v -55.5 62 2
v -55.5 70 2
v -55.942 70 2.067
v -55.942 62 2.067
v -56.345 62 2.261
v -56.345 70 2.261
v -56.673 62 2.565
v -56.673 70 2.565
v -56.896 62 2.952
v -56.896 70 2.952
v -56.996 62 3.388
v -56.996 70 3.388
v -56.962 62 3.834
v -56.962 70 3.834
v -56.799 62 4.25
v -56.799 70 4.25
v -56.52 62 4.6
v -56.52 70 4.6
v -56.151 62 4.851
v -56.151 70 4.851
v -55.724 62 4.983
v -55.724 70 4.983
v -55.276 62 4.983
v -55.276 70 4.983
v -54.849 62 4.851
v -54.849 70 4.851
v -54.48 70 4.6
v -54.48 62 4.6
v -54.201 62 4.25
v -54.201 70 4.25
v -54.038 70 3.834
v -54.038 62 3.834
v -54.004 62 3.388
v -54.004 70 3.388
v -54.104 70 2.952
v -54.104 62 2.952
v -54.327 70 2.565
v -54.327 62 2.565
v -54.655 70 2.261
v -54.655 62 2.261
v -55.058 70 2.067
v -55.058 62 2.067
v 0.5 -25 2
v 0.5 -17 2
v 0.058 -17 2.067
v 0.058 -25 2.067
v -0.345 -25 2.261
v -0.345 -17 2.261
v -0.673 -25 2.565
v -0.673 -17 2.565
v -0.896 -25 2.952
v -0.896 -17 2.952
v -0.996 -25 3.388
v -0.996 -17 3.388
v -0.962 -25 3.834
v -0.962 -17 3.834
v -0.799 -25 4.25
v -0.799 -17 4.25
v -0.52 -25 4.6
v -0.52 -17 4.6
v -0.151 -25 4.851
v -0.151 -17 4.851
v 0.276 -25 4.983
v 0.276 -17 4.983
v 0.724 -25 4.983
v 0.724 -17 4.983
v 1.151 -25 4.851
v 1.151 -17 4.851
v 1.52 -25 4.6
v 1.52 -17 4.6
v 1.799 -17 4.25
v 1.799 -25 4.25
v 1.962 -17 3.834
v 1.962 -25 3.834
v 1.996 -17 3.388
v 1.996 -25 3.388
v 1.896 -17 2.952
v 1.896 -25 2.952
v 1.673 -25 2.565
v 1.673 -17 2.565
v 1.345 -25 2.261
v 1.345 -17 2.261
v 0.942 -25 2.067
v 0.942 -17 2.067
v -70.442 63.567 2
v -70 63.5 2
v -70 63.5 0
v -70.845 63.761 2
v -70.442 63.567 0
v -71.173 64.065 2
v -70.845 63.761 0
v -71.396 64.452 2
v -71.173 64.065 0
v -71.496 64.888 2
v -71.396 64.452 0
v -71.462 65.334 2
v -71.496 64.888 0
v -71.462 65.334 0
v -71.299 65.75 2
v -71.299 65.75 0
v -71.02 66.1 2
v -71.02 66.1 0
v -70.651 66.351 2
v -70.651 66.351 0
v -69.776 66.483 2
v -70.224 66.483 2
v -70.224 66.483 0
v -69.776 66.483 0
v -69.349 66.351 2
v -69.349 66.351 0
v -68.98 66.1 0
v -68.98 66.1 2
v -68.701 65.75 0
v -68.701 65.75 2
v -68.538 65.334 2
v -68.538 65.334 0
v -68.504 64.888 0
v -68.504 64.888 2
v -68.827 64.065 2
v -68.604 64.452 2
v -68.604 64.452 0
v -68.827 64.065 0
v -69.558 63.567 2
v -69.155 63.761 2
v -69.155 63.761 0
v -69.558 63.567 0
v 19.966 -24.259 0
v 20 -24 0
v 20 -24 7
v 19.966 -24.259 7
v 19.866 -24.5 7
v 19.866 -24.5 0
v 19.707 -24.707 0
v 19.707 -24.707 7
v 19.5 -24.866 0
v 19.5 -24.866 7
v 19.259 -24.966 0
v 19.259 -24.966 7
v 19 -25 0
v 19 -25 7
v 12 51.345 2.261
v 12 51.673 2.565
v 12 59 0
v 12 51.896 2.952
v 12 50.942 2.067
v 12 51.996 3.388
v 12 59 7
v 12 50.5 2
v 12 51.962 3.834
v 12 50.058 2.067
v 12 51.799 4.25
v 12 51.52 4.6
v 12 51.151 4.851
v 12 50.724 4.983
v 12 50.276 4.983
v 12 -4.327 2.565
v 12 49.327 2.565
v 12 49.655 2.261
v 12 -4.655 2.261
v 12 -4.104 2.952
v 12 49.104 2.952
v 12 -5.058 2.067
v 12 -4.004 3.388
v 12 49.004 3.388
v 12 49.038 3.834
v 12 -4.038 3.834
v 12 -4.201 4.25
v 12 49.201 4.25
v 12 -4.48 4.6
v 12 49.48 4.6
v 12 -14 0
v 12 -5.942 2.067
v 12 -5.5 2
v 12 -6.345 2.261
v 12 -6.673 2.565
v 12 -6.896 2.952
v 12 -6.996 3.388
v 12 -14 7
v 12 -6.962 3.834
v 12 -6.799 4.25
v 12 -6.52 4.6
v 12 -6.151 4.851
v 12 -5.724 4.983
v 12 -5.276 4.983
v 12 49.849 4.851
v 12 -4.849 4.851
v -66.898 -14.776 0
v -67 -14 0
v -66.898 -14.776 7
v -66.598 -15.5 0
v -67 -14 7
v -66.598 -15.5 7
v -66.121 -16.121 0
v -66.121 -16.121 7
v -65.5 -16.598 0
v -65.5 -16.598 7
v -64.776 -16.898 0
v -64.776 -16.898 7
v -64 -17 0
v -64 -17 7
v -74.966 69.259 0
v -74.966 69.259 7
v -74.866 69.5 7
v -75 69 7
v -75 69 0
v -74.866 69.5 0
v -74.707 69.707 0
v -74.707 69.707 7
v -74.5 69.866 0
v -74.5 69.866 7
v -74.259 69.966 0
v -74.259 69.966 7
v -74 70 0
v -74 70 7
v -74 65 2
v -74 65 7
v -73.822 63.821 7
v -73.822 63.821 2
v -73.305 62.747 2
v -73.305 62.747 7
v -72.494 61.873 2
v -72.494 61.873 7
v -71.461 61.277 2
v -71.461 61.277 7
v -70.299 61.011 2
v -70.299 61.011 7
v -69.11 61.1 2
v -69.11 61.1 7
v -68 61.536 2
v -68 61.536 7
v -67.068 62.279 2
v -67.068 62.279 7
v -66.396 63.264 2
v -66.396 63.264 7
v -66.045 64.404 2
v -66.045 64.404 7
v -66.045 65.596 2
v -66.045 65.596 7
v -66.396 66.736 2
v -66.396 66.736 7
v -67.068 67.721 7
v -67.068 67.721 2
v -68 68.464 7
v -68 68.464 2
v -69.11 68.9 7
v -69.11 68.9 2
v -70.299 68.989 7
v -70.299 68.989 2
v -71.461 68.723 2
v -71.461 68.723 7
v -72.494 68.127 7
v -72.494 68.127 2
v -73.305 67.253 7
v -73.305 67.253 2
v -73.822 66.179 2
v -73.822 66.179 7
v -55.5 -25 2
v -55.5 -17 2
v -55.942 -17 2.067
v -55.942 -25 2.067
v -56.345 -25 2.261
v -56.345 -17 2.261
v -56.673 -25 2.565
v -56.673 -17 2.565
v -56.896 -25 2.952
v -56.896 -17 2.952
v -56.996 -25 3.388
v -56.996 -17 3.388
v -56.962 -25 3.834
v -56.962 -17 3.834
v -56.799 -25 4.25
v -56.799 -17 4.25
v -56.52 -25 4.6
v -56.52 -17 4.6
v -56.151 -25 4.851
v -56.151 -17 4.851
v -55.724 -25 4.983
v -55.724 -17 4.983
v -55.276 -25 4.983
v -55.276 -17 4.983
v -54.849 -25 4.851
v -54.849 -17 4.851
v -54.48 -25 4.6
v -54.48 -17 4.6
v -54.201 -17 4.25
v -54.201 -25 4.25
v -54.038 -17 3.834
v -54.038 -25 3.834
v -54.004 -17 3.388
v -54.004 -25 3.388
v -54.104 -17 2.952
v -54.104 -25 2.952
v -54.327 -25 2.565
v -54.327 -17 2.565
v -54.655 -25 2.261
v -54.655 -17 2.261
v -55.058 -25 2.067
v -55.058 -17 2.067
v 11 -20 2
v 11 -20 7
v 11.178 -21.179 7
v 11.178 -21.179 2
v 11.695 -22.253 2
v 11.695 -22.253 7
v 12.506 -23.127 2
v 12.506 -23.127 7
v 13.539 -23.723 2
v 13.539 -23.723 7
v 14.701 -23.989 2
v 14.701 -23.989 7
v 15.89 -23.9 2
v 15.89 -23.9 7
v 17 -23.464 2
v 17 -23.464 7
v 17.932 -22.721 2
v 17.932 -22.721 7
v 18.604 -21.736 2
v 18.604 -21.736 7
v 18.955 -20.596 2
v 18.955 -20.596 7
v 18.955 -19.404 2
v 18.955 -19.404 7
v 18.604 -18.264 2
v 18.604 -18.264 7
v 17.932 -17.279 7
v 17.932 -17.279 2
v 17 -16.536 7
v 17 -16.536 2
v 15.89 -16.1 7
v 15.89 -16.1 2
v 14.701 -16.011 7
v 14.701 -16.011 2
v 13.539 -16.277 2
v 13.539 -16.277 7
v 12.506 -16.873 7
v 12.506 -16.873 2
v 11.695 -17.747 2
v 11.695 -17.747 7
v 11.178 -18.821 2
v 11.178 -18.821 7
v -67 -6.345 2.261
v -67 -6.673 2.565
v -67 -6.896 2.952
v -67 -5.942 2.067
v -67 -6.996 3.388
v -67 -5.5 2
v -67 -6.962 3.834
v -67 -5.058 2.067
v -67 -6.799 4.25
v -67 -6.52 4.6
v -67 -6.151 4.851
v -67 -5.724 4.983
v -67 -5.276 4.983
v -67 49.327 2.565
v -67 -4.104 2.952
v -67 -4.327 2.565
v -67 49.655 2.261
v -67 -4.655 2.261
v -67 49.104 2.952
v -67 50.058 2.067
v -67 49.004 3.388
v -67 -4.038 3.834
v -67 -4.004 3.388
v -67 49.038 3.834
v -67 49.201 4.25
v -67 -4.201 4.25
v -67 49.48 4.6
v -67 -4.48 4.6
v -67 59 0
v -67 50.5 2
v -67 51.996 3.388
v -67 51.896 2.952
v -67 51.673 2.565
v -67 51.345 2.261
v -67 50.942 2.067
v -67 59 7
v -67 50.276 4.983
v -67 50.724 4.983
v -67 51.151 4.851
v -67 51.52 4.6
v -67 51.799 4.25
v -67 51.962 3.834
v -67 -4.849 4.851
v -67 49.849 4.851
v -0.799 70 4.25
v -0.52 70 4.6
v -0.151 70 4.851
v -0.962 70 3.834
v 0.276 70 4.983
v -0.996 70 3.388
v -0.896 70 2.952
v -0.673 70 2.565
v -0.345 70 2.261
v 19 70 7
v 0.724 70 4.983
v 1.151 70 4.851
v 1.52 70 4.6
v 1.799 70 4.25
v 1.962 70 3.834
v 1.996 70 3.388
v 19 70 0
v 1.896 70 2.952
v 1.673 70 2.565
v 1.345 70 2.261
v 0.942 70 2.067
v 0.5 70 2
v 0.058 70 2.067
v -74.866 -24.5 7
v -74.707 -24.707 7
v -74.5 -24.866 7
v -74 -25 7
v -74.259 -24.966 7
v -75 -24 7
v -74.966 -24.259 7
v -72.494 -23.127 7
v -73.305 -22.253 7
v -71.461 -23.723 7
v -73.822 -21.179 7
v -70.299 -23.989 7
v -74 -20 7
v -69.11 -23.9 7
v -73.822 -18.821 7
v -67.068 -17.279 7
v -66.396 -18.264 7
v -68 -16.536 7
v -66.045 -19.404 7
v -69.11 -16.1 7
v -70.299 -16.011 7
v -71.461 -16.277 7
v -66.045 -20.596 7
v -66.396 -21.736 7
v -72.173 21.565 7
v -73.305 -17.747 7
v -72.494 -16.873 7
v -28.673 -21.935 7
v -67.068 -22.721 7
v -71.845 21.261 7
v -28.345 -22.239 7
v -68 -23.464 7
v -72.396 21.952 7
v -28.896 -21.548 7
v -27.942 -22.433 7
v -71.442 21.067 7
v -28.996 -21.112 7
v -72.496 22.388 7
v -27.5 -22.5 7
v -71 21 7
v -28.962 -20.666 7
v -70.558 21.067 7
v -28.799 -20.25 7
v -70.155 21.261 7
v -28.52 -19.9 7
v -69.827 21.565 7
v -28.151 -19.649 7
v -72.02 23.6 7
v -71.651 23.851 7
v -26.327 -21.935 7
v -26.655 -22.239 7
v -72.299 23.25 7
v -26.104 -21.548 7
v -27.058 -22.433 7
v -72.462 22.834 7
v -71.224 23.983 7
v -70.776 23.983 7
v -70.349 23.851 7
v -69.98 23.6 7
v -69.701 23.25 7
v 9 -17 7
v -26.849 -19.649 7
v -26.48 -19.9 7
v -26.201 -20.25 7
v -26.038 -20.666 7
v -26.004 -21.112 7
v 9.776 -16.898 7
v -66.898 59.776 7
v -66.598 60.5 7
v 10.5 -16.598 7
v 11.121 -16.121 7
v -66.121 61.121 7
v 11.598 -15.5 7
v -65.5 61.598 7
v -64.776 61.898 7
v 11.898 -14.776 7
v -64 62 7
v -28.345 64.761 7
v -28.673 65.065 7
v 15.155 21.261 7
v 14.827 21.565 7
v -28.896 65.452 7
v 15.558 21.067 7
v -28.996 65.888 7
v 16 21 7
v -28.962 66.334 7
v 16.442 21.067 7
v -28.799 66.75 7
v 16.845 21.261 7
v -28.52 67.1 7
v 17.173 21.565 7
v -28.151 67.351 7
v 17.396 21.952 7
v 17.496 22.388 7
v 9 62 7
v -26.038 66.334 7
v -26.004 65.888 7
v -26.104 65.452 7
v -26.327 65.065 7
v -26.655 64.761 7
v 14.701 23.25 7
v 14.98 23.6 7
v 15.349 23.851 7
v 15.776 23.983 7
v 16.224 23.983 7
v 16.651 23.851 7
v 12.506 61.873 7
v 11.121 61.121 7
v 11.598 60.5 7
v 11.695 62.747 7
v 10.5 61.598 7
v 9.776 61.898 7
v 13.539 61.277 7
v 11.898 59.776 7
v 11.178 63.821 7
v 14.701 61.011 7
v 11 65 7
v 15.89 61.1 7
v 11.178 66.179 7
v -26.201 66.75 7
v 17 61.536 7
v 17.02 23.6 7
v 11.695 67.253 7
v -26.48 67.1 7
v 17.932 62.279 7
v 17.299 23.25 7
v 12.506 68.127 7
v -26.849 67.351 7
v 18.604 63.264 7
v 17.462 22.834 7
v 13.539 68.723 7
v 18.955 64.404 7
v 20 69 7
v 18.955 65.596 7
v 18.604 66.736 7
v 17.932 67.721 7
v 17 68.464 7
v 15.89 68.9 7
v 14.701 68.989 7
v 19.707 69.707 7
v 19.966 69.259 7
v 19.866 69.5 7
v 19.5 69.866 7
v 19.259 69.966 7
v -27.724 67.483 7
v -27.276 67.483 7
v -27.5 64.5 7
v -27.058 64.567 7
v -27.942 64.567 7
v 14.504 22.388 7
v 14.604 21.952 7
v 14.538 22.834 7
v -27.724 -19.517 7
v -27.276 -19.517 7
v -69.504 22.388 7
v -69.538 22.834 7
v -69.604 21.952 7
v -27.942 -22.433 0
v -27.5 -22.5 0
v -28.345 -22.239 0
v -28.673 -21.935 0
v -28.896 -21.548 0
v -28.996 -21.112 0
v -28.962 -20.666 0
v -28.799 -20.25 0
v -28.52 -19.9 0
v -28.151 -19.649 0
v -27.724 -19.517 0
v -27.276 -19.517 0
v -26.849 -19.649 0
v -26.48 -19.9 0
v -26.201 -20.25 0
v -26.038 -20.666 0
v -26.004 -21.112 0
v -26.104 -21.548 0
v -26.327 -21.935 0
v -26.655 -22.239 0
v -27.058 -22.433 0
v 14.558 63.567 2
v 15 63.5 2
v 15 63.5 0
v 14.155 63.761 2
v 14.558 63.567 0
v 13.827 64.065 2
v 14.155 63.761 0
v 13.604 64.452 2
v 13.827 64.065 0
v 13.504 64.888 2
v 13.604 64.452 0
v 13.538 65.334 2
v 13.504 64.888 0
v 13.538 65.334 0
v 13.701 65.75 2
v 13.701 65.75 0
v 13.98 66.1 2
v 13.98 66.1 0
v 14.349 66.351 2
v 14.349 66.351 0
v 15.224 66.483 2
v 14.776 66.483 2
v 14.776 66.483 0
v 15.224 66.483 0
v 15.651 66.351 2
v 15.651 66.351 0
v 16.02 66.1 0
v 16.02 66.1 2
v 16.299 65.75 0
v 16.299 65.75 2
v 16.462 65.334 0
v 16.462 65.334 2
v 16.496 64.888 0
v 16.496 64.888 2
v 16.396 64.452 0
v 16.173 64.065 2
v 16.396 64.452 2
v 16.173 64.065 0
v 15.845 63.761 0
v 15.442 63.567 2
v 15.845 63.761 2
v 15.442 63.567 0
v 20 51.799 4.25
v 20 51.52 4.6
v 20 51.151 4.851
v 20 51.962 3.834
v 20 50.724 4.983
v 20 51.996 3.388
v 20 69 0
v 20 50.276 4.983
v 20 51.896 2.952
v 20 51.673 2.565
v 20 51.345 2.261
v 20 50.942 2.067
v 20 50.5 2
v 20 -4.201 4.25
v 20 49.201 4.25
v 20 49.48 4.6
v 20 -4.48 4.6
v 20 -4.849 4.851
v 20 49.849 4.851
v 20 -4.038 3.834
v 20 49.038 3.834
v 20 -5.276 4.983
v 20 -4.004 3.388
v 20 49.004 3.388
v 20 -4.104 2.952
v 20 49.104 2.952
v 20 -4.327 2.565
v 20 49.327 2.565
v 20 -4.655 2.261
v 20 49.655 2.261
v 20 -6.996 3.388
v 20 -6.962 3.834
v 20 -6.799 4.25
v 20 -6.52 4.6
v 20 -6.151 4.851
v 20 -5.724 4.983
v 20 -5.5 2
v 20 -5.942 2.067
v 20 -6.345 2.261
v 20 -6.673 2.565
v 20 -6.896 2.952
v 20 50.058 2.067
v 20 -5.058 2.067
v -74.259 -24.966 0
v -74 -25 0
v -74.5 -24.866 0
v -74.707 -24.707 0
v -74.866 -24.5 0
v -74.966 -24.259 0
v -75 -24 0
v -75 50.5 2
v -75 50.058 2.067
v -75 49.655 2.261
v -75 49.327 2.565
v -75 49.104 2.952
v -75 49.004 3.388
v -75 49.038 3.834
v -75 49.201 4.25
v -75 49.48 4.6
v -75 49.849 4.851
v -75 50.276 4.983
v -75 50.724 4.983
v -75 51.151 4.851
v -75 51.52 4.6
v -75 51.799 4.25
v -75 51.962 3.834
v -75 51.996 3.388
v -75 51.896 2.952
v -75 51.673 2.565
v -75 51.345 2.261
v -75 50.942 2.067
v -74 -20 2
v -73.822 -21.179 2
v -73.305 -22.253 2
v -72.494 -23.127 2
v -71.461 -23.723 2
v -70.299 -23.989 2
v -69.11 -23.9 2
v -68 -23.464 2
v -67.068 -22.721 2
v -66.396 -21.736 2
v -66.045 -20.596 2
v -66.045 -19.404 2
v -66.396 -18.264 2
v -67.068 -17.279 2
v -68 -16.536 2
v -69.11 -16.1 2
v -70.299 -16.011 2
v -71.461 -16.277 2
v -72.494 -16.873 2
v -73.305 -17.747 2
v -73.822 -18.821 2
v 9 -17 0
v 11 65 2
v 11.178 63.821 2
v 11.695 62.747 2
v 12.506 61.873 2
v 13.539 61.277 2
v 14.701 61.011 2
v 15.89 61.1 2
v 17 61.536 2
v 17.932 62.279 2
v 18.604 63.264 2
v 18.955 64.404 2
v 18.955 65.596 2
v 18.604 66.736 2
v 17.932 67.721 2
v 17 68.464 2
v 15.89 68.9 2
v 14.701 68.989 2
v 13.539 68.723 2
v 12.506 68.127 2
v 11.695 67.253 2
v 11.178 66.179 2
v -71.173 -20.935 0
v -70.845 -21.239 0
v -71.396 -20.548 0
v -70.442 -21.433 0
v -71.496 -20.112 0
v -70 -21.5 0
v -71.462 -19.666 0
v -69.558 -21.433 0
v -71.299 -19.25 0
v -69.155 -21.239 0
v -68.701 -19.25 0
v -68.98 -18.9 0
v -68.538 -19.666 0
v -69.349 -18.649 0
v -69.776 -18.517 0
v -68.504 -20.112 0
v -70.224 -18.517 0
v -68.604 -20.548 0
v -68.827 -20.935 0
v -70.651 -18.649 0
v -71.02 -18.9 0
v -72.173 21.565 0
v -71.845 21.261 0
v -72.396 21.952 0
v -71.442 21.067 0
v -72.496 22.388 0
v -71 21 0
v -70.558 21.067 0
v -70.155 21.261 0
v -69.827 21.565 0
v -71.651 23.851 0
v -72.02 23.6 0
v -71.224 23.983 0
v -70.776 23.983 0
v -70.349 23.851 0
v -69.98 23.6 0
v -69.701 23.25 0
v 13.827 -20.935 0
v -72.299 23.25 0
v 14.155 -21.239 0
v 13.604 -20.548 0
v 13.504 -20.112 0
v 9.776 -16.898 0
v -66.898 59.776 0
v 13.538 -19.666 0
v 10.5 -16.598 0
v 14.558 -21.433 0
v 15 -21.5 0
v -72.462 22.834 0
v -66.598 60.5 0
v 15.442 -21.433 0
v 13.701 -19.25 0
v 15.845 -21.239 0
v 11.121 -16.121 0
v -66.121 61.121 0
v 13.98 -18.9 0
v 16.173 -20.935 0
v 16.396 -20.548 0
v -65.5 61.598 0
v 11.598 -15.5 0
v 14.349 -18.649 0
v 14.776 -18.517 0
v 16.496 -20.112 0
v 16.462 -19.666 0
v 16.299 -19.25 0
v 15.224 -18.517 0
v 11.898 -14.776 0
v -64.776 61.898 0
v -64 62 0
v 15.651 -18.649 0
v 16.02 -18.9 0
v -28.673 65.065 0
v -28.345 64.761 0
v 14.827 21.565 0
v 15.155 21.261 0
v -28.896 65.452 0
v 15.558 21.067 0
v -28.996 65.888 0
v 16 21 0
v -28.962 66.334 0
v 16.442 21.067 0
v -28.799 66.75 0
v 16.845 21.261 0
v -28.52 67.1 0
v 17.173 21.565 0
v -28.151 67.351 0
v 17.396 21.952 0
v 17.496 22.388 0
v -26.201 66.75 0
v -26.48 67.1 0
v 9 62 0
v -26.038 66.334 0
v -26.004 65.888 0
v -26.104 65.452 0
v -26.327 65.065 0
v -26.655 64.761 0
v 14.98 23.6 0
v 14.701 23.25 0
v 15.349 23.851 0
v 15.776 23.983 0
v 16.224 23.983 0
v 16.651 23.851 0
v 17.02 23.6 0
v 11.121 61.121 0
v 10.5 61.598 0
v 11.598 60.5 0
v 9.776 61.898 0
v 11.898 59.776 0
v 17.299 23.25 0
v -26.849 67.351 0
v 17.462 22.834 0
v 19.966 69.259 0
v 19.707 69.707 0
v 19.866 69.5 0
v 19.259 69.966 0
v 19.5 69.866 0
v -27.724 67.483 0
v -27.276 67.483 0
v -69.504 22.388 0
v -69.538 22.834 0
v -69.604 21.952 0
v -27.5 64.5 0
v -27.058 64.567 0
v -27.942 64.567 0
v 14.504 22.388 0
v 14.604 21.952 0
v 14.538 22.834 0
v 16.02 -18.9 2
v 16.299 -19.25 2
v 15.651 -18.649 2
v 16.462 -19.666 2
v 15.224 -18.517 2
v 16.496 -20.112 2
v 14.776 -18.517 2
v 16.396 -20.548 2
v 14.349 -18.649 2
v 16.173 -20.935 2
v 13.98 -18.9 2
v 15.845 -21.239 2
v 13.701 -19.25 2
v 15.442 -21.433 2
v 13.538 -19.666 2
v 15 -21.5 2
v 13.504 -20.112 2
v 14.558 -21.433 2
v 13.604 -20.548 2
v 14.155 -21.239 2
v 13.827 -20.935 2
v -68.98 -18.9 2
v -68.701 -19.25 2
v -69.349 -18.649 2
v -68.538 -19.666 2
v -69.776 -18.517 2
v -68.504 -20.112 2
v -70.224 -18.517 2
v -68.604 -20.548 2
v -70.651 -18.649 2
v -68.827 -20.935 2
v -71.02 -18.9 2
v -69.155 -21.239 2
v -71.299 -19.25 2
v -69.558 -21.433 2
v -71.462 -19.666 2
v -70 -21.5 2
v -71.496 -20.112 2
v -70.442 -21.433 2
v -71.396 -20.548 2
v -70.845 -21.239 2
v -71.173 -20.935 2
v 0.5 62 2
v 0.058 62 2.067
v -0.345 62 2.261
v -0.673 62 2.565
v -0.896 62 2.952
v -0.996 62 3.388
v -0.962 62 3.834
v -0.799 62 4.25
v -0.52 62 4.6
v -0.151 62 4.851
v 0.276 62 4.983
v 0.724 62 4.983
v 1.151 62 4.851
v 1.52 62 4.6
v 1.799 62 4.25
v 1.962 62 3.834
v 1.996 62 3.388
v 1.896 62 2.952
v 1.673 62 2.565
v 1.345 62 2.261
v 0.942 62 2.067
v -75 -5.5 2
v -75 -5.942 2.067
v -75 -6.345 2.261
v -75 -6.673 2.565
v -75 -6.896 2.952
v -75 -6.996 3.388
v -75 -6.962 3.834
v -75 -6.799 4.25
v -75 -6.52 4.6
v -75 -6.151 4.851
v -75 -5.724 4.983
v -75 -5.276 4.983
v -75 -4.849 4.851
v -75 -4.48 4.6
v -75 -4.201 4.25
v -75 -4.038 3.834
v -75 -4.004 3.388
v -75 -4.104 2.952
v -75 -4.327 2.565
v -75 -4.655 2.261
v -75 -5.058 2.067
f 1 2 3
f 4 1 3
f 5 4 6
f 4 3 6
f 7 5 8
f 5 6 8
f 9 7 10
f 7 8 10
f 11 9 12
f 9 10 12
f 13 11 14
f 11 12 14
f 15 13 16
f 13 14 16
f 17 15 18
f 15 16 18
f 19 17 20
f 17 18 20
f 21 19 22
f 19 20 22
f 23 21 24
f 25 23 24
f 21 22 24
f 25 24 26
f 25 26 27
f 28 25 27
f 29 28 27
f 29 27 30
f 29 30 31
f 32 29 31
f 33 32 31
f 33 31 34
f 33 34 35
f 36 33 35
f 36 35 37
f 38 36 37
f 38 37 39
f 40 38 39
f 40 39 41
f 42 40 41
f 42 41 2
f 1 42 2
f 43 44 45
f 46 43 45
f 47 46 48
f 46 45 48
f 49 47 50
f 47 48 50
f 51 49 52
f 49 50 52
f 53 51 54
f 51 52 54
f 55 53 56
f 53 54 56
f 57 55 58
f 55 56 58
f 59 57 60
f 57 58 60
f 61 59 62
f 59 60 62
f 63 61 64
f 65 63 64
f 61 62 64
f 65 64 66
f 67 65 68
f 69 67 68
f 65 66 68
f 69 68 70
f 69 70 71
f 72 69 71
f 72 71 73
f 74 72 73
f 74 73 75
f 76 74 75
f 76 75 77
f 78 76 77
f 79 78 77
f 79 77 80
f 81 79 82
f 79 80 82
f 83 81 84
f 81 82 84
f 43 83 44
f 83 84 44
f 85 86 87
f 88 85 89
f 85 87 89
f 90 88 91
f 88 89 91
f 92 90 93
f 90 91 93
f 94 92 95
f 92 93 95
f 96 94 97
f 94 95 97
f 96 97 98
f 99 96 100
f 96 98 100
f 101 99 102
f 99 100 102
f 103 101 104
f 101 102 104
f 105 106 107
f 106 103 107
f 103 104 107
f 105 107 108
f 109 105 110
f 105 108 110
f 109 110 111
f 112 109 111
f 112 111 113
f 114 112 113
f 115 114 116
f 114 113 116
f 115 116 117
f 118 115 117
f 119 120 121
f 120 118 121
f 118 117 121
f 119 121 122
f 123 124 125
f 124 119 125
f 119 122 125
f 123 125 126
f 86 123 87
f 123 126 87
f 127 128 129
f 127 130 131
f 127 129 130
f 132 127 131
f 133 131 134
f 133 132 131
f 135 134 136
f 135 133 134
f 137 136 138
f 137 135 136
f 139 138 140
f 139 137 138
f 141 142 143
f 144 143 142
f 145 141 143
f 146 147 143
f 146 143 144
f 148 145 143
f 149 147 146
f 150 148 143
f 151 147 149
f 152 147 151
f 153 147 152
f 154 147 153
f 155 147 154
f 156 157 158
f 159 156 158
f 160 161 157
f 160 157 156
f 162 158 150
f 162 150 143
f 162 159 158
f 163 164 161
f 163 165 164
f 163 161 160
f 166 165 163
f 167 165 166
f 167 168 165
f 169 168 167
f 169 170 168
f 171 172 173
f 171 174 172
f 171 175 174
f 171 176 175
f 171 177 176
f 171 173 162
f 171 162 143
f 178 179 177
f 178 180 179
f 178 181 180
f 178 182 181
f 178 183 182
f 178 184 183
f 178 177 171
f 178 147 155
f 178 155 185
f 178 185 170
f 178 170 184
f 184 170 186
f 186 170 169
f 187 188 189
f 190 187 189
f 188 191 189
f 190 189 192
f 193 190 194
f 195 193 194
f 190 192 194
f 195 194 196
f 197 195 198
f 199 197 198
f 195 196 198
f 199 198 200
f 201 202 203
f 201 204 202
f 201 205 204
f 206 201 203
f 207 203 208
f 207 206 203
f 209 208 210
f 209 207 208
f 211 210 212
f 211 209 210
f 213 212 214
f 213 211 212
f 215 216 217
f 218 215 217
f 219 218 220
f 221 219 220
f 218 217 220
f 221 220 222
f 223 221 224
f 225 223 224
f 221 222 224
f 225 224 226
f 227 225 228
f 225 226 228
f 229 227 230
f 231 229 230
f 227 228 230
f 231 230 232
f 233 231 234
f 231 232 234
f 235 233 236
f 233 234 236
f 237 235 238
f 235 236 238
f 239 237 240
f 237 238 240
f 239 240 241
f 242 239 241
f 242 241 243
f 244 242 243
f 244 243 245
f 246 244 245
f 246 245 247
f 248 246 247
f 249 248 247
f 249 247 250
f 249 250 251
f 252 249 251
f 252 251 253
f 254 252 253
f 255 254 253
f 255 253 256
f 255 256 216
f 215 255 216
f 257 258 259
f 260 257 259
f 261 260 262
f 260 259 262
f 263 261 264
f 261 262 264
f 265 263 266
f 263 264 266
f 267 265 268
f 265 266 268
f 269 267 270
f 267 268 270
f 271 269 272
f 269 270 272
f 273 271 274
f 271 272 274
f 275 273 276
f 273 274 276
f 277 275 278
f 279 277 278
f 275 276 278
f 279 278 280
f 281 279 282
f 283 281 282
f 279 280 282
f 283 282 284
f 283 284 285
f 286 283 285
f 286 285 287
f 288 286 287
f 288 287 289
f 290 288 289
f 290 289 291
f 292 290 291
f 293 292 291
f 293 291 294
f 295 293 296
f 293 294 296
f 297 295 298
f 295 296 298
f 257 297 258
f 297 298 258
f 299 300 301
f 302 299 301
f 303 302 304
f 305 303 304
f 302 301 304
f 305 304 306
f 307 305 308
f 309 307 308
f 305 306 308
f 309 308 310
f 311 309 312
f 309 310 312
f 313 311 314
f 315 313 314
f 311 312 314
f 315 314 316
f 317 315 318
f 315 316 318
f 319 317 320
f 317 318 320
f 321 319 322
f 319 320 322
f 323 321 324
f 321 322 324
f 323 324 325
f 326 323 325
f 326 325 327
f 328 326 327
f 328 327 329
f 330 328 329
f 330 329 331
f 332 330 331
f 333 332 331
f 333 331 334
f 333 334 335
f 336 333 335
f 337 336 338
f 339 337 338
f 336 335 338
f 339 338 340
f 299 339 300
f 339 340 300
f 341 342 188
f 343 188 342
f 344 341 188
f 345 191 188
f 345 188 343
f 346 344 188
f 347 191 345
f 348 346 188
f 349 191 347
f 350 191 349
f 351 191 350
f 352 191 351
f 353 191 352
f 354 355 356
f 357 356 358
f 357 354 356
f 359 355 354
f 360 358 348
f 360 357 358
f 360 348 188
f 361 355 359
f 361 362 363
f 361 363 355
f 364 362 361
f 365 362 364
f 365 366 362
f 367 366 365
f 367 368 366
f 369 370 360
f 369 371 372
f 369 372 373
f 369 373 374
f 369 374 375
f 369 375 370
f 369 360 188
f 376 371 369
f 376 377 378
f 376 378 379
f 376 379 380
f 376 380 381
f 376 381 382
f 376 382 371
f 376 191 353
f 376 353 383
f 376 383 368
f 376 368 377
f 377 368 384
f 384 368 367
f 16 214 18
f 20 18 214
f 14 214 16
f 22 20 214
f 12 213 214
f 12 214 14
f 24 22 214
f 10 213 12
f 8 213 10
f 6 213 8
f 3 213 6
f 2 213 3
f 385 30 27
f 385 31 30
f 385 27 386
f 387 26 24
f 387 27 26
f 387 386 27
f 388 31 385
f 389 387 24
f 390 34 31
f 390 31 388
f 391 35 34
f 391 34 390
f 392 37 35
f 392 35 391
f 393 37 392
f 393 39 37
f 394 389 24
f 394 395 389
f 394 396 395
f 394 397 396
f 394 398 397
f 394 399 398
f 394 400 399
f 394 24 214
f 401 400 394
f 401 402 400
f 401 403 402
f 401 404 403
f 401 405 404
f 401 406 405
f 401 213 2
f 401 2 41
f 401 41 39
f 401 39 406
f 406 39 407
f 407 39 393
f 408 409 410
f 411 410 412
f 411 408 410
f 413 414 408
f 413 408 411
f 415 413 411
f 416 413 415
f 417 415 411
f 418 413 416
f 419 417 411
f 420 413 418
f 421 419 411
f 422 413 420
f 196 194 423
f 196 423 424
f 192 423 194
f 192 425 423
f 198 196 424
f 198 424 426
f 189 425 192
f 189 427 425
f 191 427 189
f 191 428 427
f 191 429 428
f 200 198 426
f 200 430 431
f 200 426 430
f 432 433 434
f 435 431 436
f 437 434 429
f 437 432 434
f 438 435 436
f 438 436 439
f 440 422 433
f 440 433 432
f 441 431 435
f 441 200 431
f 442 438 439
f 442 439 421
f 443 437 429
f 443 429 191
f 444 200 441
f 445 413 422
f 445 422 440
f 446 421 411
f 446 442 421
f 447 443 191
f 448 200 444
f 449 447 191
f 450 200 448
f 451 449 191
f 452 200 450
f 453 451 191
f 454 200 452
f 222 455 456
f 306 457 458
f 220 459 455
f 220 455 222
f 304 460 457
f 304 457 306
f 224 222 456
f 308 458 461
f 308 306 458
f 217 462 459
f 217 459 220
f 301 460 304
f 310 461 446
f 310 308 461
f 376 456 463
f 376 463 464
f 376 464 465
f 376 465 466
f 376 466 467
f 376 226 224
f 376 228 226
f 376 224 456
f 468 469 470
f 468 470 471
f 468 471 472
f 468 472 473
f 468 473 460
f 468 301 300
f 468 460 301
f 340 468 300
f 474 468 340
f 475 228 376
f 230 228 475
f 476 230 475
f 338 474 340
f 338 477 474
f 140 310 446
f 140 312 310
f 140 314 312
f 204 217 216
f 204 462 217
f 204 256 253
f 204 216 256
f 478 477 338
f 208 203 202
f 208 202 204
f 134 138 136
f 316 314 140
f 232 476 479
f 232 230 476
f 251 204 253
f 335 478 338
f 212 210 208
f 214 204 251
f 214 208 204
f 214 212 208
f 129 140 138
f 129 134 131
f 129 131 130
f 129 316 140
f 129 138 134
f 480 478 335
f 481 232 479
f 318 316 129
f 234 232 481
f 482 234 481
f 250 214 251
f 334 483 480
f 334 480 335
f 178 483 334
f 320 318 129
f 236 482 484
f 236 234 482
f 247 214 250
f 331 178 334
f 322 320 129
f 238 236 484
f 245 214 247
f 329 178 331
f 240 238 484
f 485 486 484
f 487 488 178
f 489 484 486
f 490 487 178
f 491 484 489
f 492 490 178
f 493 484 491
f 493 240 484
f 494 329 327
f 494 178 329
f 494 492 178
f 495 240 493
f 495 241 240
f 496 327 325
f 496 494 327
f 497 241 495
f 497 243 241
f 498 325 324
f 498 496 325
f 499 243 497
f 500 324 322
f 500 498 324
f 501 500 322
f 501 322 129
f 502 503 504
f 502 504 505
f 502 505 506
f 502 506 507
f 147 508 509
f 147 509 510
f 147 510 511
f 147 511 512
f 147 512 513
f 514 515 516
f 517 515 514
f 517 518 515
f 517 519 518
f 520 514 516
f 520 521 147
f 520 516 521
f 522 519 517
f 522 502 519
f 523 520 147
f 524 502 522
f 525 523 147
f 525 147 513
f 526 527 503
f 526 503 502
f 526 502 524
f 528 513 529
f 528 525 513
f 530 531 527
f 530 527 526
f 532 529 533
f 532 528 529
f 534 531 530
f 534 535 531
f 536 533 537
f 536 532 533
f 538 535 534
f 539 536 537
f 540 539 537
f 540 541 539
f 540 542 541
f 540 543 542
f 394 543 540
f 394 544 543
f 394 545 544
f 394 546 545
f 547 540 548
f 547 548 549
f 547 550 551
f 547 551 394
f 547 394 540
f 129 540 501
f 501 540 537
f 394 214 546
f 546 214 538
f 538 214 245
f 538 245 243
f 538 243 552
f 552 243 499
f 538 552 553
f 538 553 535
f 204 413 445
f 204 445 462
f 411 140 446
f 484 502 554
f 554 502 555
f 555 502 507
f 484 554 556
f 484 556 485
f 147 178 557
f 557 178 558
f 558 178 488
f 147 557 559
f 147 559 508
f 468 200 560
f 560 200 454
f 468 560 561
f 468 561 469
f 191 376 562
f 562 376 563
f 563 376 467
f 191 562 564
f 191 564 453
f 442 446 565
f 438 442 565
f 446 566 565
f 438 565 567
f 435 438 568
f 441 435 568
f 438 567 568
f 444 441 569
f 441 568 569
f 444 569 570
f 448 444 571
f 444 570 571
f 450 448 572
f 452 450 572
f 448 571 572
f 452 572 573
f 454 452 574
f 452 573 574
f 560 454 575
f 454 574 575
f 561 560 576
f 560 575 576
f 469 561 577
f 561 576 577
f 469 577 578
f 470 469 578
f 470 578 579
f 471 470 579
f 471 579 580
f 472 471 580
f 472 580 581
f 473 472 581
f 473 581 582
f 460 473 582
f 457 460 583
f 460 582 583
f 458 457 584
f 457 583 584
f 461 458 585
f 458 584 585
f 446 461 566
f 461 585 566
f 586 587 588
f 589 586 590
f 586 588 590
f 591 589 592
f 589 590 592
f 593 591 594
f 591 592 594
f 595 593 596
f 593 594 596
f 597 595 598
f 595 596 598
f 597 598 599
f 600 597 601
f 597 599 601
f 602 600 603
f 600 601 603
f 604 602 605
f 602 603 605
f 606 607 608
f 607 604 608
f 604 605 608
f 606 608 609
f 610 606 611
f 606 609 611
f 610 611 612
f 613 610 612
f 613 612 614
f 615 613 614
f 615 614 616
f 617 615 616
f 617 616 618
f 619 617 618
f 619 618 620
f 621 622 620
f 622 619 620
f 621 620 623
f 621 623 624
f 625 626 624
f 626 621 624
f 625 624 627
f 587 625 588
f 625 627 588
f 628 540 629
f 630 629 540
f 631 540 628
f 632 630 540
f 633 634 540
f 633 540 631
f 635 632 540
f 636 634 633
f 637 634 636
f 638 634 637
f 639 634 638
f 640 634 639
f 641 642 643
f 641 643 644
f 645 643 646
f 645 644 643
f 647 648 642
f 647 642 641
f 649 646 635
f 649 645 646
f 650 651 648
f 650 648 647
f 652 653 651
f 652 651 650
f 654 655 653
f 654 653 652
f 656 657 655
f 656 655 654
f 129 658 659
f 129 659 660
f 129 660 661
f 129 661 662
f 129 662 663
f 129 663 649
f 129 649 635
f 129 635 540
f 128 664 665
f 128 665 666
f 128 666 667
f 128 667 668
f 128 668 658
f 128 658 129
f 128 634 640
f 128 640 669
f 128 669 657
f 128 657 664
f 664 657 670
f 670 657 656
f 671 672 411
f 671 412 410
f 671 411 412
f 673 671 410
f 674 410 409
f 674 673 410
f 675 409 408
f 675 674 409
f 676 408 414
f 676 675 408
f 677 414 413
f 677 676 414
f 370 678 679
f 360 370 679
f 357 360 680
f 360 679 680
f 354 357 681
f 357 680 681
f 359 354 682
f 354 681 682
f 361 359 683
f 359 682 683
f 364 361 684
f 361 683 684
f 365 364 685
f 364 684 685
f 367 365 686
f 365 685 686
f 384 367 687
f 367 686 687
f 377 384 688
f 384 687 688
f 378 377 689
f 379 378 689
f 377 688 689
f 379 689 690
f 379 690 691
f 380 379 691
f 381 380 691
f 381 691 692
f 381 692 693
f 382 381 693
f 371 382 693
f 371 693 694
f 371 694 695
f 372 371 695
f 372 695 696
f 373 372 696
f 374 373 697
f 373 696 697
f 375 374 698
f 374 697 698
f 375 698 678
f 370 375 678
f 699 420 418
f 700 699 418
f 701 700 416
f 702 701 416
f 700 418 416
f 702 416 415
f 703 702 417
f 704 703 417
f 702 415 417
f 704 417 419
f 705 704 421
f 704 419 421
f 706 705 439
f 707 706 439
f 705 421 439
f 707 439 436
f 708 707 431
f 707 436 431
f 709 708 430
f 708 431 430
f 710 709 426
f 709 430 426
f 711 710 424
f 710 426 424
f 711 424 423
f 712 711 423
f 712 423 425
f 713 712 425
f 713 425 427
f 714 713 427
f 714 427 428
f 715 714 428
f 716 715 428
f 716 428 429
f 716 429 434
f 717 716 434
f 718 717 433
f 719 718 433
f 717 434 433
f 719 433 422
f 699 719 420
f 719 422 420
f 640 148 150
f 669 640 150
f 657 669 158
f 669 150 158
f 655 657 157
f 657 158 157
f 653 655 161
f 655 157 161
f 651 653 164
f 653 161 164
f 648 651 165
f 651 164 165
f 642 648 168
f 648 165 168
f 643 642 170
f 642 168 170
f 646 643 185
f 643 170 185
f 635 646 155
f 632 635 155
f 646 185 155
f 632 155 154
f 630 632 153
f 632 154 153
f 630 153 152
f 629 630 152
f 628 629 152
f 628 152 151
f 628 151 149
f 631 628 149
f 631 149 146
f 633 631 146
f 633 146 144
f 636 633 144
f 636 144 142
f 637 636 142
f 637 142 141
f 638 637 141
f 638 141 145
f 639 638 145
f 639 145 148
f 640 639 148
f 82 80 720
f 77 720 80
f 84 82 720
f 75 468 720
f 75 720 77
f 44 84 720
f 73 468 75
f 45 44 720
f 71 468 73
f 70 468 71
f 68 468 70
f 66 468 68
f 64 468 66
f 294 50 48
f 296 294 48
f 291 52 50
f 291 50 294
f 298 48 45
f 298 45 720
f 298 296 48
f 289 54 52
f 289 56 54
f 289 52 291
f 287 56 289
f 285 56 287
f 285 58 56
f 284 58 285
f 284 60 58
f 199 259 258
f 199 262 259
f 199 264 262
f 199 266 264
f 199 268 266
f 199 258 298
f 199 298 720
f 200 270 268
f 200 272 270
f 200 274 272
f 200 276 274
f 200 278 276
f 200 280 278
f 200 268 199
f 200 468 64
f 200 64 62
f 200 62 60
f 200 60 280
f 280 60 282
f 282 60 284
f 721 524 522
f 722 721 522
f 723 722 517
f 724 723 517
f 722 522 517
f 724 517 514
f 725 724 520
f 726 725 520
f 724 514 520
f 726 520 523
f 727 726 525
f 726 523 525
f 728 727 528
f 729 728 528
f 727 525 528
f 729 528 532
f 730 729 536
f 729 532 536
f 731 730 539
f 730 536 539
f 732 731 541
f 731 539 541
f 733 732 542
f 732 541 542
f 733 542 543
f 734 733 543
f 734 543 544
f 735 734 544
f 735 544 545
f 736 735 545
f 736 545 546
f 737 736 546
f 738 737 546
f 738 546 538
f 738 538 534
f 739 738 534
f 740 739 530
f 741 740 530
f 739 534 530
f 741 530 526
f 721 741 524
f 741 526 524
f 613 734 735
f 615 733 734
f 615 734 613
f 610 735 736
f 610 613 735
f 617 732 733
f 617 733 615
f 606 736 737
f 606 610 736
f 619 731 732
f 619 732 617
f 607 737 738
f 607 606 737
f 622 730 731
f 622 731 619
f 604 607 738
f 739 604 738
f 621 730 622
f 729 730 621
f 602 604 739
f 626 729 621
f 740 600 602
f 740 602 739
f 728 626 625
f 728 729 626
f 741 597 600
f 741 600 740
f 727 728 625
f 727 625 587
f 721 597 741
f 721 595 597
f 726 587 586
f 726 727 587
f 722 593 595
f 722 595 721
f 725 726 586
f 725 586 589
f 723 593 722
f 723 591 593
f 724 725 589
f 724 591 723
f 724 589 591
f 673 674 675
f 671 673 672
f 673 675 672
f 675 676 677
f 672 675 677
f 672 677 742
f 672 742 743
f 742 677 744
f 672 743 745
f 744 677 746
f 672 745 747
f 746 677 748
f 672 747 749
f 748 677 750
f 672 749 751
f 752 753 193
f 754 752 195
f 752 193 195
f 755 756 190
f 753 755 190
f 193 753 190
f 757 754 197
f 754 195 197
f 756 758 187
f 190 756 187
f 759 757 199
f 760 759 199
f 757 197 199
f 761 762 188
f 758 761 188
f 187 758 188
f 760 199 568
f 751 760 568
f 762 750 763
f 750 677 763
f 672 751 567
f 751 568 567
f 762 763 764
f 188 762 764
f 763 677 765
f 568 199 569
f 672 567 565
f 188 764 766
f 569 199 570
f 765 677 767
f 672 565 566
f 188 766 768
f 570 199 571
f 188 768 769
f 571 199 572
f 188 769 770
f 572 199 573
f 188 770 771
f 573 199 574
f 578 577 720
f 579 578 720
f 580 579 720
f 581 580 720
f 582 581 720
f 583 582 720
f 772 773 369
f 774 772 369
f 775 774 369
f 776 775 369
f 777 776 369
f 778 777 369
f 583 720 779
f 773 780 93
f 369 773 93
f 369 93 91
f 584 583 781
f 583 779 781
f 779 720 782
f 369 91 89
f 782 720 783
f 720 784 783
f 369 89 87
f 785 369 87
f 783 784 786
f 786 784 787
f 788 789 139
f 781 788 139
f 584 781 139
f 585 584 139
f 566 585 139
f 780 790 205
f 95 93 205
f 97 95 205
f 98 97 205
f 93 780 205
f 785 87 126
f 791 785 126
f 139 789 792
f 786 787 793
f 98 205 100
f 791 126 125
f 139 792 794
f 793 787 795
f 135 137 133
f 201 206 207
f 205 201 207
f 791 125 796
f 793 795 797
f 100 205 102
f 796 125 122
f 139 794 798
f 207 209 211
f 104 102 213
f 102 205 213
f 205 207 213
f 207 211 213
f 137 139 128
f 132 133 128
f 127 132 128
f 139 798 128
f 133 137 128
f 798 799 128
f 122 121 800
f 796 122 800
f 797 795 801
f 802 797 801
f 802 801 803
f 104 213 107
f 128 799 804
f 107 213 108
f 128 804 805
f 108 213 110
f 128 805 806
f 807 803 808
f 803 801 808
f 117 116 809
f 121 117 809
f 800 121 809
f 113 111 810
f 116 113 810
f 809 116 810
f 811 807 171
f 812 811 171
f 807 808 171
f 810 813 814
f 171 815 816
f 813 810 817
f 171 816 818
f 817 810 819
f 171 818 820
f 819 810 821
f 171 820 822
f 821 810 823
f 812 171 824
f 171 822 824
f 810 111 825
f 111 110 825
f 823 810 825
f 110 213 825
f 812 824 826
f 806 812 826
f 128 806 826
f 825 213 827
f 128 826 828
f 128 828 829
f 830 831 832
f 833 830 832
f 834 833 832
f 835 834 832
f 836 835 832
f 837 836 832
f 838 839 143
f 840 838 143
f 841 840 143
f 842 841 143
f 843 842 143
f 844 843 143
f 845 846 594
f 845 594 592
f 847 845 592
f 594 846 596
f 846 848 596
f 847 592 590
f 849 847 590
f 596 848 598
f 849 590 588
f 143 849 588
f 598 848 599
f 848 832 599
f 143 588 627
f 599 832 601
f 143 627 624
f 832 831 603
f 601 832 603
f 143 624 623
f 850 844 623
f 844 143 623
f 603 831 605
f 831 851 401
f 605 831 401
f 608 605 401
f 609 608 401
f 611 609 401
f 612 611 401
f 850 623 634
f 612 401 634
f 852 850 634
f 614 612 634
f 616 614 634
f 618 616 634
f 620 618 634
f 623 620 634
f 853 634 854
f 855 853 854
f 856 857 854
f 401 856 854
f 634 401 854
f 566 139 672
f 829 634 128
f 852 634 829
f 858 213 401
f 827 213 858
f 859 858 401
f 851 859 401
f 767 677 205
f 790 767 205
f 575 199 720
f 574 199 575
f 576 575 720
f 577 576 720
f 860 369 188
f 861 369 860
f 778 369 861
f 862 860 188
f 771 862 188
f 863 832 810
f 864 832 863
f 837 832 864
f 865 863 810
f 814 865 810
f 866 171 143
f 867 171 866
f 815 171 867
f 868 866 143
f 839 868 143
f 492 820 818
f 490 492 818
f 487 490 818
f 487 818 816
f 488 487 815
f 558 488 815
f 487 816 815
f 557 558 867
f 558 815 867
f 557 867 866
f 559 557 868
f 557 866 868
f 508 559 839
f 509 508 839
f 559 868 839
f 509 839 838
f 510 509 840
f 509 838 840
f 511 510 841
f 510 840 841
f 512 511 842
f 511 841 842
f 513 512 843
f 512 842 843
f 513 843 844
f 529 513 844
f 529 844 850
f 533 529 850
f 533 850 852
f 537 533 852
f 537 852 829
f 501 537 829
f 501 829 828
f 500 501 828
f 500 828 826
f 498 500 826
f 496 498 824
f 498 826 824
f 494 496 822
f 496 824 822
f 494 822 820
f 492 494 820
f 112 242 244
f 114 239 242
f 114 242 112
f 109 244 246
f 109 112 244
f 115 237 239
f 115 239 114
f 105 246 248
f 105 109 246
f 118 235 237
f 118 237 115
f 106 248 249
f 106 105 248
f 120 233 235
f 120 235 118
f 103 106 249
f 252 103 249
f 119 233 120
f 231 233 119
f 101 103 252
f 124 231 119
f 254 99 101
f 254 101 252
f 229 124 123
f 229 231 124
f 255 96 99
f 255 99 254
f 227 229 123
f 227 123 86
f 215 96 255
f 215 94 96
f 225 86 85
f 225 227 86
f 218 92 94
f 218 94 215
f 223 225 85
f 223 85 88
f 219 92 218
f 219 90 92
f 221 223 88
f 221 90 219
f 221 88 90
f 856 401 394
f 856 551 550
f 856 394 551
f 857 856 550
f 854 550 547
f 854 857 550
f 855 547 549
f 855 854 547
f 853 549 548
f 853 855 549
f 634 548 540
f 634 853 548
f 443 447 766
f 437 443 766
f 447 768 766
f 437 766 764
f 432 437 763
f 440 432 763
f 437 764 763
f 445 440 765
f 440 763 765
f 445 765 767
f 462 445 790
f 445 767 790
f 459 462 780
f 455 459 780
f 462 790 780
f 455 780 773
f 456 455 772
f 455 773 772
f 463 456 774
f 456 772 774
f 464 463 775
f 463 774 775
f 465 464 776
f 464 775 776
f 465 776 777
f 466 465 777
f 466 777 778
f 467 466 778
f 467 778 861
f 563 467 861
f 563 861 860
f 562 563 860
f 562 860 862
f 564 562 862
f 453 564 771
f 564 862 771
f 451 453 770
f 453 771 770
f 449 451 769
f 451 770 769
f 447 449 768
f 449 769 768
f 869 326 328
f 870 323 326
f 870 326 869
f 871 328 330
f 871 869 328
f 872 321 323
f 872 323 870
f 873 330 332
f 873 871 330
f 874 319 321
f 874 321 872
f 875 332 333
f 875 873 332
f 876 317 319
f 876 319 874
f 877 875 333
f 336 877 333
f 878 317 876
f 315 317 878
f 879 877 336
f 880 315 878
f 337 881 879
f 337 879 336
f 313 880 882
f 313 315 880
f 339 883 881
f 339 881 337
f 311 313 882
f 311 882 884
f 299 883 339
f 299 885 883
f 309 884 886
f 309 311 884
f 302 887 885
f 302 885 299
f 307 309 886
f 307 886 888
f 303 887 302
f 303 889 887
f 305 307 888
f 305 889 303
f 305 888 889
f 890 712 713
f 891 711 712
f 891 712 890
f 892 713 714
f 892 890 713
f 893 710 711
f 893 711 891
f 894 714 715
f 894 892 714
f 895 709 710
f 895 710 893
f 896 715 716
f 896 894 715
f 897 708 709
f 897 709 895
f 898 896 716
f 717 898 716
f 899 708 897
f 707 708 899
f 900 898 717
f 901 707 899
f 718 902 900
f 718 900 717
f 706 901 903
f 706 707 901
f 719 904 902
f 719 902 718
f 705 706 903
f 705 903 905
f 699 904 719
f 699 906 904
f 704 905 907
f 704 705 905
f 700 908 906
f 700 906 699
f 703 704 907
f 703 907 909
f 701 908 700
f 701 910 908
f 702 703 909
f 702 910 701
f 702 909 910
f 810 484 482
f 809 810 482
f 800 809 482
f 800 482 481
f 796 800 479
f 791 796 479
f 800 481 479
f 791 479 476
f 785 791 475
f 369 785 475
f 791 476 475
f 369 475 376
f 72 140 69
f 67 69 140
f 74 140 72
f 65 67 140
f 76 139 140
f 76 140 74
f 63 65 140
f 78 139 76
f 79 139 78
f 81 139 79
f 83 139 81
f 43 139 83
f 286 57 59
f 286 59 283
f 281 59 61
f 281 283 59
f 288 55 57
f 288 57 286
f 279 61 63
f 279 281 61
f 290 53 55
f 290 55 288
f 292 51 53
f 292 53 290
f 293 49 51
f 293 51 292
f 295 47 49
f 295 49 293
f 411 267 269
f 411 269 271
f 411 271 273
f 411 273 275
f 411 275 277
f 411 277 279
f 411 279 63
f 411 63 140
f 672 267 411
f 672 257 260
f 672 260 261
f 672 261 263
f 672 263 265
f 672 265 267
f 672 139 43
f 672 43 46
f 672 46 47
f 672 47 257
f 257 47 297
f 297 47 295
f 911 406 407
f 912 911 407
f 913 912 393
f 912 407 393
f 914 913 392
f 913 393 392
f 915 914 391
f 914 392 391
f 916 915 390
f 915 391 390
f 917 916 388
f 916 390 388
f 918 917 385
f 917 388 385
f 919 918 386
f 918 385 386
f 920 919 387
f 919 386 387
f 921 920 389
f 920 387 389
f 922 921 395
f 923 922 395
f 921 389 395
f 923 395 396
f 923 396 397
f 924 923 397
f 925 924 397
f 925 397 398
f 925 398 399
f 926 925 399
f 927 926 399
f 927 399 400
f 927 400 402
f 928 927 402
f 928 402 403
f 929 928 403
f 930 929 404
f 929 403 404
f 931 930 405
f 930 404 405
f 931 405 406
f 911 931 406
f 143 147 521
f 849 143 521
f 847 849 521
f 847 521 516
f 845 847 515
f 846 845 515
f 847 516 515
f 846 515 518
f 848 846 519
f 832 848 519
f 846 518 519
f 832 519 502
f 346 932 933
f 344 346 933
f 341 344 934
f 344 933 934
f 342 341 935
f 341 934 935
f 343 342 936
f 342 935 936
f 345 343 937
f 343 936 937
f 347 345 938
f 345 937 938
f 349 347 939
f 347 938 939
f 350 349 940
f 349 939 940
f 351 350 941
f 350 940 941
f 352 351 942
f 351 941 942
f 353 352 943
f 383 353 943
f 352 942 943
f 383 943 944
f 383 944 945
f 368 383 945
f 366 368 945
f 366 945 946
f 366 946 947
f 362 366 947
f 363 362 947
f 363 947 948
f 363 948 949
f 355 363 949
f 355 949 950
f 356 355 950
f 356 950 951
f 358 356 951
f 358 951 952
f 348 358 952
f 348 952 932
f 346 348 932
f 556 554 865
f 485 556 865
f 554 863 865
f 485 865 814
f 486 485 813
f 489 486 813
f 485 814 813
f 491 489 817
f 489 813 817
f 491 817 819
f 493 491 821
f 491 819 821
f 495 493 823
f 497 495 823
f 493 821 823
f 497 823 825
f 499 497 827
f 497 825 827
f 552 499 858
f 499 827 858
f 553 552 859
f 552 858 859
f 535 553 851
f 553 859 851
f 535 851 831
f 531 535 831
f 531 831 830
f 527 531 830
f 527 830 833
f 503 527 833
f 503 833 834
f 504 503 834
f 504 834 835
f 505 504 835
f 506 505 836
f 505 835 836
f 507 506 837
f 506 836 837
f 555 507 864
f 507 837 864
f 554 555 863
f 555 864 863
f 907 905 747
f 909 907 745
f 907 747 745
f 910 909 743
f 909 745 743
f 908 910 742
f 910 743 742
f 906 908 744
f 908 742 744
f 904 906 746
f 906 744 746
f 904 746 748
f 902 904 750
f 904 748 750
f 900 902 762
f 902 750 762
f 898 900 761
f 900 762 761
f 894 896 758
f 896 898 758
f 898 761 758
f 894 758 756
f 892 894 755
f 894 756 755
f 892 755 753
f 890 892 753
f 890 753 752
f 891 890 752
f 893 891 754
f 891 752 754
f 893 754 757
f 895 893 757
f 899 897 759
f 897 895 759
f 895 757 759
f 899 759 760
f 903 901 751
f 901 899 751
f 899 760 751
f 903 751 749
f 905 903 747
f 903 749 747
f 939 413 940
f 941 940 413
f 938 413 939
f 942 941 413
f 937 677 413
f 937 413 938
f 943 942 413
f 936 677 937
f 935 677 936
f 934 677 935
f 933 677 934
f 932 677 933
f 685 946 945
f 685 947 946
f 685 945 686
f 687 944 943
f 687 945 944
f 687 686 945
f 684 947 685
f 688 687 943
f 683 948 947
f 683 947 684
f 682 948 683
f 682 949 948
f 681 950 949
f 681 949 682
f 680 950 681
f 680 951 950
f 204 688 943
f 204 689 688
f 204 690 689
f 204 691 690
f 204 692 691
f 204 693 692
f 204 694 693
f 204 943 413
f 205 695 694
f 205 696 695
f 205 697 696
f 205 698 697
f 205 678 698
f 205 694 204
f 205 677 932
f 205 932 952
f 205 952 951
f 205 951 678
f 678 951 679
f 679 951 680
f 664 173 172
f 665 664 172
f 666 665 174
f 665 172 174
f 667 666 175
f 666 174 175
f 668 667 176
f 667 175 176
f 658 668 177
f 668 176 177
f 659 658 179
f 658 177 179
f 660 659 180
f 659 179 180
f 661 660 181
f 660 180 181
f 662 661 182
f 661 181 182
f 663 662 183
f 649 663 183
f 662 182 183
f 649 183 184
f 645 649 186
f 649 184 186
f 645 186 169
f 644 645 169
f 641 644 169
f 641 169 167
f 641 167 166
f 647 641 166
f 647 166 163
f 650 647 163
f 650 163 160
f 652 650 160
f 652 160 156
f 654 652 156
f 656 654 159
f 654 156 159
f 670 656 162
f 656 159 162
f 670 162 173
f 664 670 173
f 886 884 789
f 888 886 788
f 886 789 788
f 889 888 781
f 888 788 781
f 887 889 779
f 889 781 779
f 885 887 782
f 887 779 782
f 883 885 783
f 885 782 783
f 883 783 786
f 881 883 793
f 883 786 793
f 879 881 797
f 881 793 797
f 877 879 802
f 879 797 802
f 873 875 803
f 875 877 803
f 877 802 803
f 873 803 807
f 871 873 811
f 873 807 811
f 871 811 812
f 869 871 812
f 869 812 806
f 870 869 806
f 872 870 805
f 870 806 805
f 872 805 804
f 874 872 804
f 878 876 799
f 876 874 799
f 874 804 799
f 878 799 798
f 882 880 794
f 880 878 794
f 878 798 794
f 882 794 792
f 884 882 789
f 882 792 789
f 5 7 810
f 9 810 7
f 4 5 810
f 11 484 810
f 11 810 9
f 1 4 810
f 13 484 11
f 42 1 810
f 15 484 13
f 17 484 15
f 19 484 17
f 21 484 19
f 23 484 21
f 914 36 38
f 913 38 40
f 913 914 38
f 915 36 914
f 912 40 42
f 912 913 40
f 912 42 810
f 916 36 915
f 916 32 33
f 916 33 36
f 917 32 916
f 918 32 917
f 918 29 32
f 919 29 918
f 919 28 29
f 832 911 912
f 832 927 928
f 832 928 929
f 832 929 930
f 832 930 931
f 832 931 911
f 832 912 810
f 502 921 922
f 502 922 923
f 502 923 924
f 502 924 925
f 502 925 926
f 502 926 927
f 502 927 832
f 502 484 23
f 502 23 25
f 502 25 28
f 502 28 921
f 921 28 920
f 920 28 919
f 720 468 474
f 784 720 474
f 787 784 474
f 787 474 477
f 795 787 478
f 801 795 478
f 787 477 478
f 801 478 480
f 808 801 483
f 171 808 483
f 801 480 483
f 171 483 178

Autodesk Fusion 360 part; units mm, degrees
sketch "Sketch1" plane through (0, 0, 0) normal (0, 0, 1) x (1, 0, 0)
  line L0 (19, -25) -> (-74, -25)
  line L1 (-75, -24) -> (-75, 69)
  line L2 (-74, 70) -> (19, 70)
  line L3 (20, 69) -> (20, -24)
  arc A0 (-74, 70) -> (-75, 69) centre (-74, 69) ccw
  arc A1 (20, 69) -> (19, 70) centre (19, 69) ccw
  arc A2 (-75, -24) -> (-74, -25) centre (-74, -24) ccw
  arc A3 (19, -25) -> (20, -24) centre (19, -24) ccw
  point P0 (20, -25)
  point P1 (-75, -25)
  point P2 (20, 70)
  dimension "d1" = 95
  dimension "d2" = 95
  dimension "d3" = 1
extrude "Extrude1" add sketch "Sketch1" along normal blind 7
sketch "Sketch2" plane through (0, 0, 7) normal (0, 0, 1) x (-1, 0, 0)
  arc A0 (75, 24) -> (74, 25) centre (74, 24) ccw
  line L0 (74, 25) -> (-19, 25)
  arc A1 (-19, 25) -> (-20, 24) centre (-19, 24) ccw
  line L1 (-20, 24) -> (-20, -69)
  arc A2 (-20, -69) -> (-19, -70) centre (-19, -69) ccw
  line L2 (-19, -70) -> (74, -70)
  arc A3 (74, -70) -> (75, -69) centre (74, -69) ccw
  line L3 (75, -69) -> (75, 24)
  line L4 (64, -62) -> (-9, -62)
  line L5 (-12, -59) -> (-12, 14)
  line L6 (-9, 17) -> (64, 17)
  line L7 (67, 14) -> (67, -59)
  arc A4 (64, -62) -> (67, -59) centre (64, -59) ccw
  arc A5 (-12, -59) -> (-9, -62) centre (-9, -59) ccw
  arc A6 (-9, 17) -> (-12, 14) centre (-9, 14) ccw
  arc A7 (67, 14) -> (64, 17) centre (64, 14) ccw
  point P0 (67, -62)
  point P1 (-12, -62)
  point P2 (67, 17)
  dimension "d6" = 79
  dimension "d7" = 79
  dimension "d8" = 3
  dimension "d9" = 8
  dimension "d10" = 8
extrude "Extrude2" cut sketch "Sketch2" against normal blind 19 contours L4 L5 L6 L7 A4 A5 A6 A7
sketch "Sketch3" plane through (0, 0, 7) normal (0, 0, 1) x (-1, 0, 0)
  line L0 (67, 14) -> (67, -59)
  arc A0 (64, -62) -> (67, -59) centre (64, -59) ccw
  line L1 (64, -62) -> (-9, -62)
  arc A1 (-12, -59) -> (-9, -62) centre (-9, -59) ccw
  line L2 (-12, -59) -> (-12, 14)
  arc A2 (-9, 17) -> (-12, 14) centre (-9, 14) ccw
  line L3 (-9, 17) -> (64, 17)
  arc A3 (67, 14) -> (64, 17) centre (64, 14) ccw
  arc A4 (75, 24) -> (74, 25) centre (74, 24) ccw
  line L4 (74, 25) -> (-19, 25)
  arc A5 (-19, 25) -> (-20, 24) centre (-19, 24) ccw
  line L5 (-20, 24) -> (-20, -69)
  arc A6 (-20, -69) -> (-19, -70) centre (-19, -69) ccw
  line L6 (-19, -70) -> (74, -70)
  arc A7 (74, -70) -> (75, -69) centre (74, -69) ccw
  line L7 (75, -69) -> (75, 24)
  point P0 (27.5, 21)
  point P1 (71, -22.5)
  point P2 (-16, -22.5)
  point P3 (27.5, -66)
  dimension "d13" = 4
  dimension "d14" = 47.5
  dimension "d15" = 4
  dimension "d16" = 47.5
  dimension "d17" = 4
  dimension "d18" = 47.5
  dimension "d19" = 4
  dimension "d20" = 47.5
hole "Hole1" at (-27.5, 66, 7) at (16, 22.5, 7) at (-27.5, -21, 7) at (-71, 22.5, 7) direction (0, 0, -1) diameter 3 depth 25 tip angle 118
sketch "Sketch4" plane through (0, -25, 0) normal (0, -1, 0) x (1, 0, 0)
  line L0 (-74, 0) -> (19, 0)
  line L1 (19, 0) -> (19, 7)
  line L2 (19, 7) -> (-74, 7)
  line L3 (-74, 7) -> (-74, 0)
  line L4 (-75, 0) -> (-75, 7)
  point P0 (-27.5, 3.5)
  point P1 (-55.5, 3.5)
  point P2 (0.5, 3.5)
  dimension "d24" = 3.5
  dimension "d25" = 3.5
  dimension "d26" = 3.5
  dimension "d27" = 47.5
  dimension "d28" = 28
  dimension "d29" = 28
hole "Hole2" at (-55.5, -25, 3.5) at (0.5, -25, 3.5) direction (0, 1, 0) diameter 3 depth 124 tip angle 118
sketch "Sketch5" plane through (20, 0, 0) normal (1, 0, 0) x (0, 1, 0)
  line L0 (-24, 0) -> (69, 0)
  line L1 (69, 0) -> (69, 7)
  line L2 (69, 7) -> (-24, 7)
  line L3 (-24, 7) -> (-24, 0)
  line L4 (-25, 0) -> (-25, 7)
  point P0 (-5.5, 3.5)
  point P1 (22.5, 3.5)
  point P2 (50.5, 3.5)
  dimension "d33" = 3.5
  dimension "d34" = 3.5
  dimension "d35" = 3.5
  dimension "d36" = 47.5
  dimension "d37" = 28
  dimension "d38" = 28
hole "Hole3" at (20, -5.5, 3.5) at (20, 50.5, 3.5) direction (-1, 0, 0) diameter 3 depth 124 tip angle 118
sketch "Sketch6" plane through (0, 0, 7) normal (0, 0, 1) x (-1, 0, 0)
  circle A0 centre (27.5, 21) radius 1.5
  circle A1 centre (27.5, -66) radius 1.5
  circle A2 centre (-16, -22.5) radius 1.5
  circle A3 centre (71, -22.5) radius 1.5
  line L0 (67, 14) -> (67, -59)
  arc A4 (64, -62) -> (67, -59) centre (64, -59) ccw
  line L1 (64, -62) -> (-9, -62)
  arc A5 (-12, -59) -> (-9, -62) centre (-9, -59) ccw
  line L2 (-12, -59) -> (-12, 14)
  arc A6 (-9, 17) -> (-12, 14) centre (-9, 14) ccw
  line L3 (-9, 17) -> (64, 17)
  arc A7 (67, 14) -> (64, 17) centre (64, 14) ccw
  arc A8 (75, 24) -> (74, 25) centre (74, 24) ccw
  line L4 (74, 25) -> (-19, 25)
  arc A9 (-19, 25) -> (-20, 24) centre (-19, 24) ccw
  line L5 (-20, 24) -> (-20, -69)
  arc A10 (-20, -69) -> (-19, -70) centre (-19, -69) ccw
  line L6 (-19, -70) -> (74, -70)
  arc A11 (74, -70) -> (75, -69) centre (74, -69) ccw
  line L7 (75, -69) -> (75, 24)
  point P0 (70, 20)
  point P1 (-15, 20)
  point P2 (70, -65)
  point P3 (-15, -65)
  dimension "d42" = 5
  dimension "d43" = 5
  dimension "d44" = 5
  dimension "d45" = 5
  dimension "d46" = 5
  dimension "d47" = 5
  dimension "d48" = 5
  dimension "d49" = 5
hole "Hole4" at (15, 65, 7) at (-70, 65, 7) at (-70, -20, 7) at (15, -20, 7) direction (0, 0, -1) diameter 3 depth 10 tip angle 118
sketch "Sketch7" plane through (0, 0, 7) normal (0, 0, 1) x (-1, 0, 0)
  circle A0 centre (70, 20) radius 1.5
  circle A1 centre (-15, -65) radius 1.5
  circle A2 centre (70, -65) radius 1.5
  circle A3 centre (-15, 20) radius 1.5
  circle A4 centre (27.5, 21) radius 1.5
  circle A5 centre (27.5, -66) radius 1.5
  circle A6 centre (-16, -22.5) radius 1.5
  circle A7 centre (71, -22.5) radius 1.5
  line L0 (67, 14) -> (67, -59)
  arc A8 (64, -62) -> (67, -59) centre (64, -59) ccw
  line L1 (64, -62) -> (-9, -62)
  arc A9 (-12, -59) -> (-9, -62) centre (-9, -59) ccw
  line L2 (-12, -59) -> (-12, 14)
  arc A10 (-9, 17) -> (-12, 14) centre (-9, 14) ccw
  line L3 (-9, 17) -> (64, 17)
  arc A11 (67, 14) -> (64, 17) centre (64, 14) ccw
  arc A12 (75, 24) -> (74, 25) centre (74, 24) ccw
  line L4 (74, 25) -> (-19, 25)
  arc A13 (-19, 25) -> (-20, 24) centre (-19, 24) ccw
  line L5 (-20, 24) -> (-20, -69)
  arc A14 (-20, -69) -> (-19, -70) centre (-19, -69) ccw
  line L6 (-19, -70) -> (74, -70)
  arc A15 (74, -70) -> (75, -69) centre (74, -69) ccw
  line L7 (75, -69) -> (75, 24)
  circle A16 centre (70, -65) radius 4
  circle A17 centre (-15, -65) radius 4
  circle A18 centre (70, 20) radius 4
  circle A19 centre (-15, 20) radius 4
  dimension "d53" = 8
  dimension "d54" = 8
  dimension "d55" = 8
  dimension "d56" = 8
extrude "Extrude3" cut sketch "Sketch7" against normal blind 5 contours A16 | A17 | A18 | A19
